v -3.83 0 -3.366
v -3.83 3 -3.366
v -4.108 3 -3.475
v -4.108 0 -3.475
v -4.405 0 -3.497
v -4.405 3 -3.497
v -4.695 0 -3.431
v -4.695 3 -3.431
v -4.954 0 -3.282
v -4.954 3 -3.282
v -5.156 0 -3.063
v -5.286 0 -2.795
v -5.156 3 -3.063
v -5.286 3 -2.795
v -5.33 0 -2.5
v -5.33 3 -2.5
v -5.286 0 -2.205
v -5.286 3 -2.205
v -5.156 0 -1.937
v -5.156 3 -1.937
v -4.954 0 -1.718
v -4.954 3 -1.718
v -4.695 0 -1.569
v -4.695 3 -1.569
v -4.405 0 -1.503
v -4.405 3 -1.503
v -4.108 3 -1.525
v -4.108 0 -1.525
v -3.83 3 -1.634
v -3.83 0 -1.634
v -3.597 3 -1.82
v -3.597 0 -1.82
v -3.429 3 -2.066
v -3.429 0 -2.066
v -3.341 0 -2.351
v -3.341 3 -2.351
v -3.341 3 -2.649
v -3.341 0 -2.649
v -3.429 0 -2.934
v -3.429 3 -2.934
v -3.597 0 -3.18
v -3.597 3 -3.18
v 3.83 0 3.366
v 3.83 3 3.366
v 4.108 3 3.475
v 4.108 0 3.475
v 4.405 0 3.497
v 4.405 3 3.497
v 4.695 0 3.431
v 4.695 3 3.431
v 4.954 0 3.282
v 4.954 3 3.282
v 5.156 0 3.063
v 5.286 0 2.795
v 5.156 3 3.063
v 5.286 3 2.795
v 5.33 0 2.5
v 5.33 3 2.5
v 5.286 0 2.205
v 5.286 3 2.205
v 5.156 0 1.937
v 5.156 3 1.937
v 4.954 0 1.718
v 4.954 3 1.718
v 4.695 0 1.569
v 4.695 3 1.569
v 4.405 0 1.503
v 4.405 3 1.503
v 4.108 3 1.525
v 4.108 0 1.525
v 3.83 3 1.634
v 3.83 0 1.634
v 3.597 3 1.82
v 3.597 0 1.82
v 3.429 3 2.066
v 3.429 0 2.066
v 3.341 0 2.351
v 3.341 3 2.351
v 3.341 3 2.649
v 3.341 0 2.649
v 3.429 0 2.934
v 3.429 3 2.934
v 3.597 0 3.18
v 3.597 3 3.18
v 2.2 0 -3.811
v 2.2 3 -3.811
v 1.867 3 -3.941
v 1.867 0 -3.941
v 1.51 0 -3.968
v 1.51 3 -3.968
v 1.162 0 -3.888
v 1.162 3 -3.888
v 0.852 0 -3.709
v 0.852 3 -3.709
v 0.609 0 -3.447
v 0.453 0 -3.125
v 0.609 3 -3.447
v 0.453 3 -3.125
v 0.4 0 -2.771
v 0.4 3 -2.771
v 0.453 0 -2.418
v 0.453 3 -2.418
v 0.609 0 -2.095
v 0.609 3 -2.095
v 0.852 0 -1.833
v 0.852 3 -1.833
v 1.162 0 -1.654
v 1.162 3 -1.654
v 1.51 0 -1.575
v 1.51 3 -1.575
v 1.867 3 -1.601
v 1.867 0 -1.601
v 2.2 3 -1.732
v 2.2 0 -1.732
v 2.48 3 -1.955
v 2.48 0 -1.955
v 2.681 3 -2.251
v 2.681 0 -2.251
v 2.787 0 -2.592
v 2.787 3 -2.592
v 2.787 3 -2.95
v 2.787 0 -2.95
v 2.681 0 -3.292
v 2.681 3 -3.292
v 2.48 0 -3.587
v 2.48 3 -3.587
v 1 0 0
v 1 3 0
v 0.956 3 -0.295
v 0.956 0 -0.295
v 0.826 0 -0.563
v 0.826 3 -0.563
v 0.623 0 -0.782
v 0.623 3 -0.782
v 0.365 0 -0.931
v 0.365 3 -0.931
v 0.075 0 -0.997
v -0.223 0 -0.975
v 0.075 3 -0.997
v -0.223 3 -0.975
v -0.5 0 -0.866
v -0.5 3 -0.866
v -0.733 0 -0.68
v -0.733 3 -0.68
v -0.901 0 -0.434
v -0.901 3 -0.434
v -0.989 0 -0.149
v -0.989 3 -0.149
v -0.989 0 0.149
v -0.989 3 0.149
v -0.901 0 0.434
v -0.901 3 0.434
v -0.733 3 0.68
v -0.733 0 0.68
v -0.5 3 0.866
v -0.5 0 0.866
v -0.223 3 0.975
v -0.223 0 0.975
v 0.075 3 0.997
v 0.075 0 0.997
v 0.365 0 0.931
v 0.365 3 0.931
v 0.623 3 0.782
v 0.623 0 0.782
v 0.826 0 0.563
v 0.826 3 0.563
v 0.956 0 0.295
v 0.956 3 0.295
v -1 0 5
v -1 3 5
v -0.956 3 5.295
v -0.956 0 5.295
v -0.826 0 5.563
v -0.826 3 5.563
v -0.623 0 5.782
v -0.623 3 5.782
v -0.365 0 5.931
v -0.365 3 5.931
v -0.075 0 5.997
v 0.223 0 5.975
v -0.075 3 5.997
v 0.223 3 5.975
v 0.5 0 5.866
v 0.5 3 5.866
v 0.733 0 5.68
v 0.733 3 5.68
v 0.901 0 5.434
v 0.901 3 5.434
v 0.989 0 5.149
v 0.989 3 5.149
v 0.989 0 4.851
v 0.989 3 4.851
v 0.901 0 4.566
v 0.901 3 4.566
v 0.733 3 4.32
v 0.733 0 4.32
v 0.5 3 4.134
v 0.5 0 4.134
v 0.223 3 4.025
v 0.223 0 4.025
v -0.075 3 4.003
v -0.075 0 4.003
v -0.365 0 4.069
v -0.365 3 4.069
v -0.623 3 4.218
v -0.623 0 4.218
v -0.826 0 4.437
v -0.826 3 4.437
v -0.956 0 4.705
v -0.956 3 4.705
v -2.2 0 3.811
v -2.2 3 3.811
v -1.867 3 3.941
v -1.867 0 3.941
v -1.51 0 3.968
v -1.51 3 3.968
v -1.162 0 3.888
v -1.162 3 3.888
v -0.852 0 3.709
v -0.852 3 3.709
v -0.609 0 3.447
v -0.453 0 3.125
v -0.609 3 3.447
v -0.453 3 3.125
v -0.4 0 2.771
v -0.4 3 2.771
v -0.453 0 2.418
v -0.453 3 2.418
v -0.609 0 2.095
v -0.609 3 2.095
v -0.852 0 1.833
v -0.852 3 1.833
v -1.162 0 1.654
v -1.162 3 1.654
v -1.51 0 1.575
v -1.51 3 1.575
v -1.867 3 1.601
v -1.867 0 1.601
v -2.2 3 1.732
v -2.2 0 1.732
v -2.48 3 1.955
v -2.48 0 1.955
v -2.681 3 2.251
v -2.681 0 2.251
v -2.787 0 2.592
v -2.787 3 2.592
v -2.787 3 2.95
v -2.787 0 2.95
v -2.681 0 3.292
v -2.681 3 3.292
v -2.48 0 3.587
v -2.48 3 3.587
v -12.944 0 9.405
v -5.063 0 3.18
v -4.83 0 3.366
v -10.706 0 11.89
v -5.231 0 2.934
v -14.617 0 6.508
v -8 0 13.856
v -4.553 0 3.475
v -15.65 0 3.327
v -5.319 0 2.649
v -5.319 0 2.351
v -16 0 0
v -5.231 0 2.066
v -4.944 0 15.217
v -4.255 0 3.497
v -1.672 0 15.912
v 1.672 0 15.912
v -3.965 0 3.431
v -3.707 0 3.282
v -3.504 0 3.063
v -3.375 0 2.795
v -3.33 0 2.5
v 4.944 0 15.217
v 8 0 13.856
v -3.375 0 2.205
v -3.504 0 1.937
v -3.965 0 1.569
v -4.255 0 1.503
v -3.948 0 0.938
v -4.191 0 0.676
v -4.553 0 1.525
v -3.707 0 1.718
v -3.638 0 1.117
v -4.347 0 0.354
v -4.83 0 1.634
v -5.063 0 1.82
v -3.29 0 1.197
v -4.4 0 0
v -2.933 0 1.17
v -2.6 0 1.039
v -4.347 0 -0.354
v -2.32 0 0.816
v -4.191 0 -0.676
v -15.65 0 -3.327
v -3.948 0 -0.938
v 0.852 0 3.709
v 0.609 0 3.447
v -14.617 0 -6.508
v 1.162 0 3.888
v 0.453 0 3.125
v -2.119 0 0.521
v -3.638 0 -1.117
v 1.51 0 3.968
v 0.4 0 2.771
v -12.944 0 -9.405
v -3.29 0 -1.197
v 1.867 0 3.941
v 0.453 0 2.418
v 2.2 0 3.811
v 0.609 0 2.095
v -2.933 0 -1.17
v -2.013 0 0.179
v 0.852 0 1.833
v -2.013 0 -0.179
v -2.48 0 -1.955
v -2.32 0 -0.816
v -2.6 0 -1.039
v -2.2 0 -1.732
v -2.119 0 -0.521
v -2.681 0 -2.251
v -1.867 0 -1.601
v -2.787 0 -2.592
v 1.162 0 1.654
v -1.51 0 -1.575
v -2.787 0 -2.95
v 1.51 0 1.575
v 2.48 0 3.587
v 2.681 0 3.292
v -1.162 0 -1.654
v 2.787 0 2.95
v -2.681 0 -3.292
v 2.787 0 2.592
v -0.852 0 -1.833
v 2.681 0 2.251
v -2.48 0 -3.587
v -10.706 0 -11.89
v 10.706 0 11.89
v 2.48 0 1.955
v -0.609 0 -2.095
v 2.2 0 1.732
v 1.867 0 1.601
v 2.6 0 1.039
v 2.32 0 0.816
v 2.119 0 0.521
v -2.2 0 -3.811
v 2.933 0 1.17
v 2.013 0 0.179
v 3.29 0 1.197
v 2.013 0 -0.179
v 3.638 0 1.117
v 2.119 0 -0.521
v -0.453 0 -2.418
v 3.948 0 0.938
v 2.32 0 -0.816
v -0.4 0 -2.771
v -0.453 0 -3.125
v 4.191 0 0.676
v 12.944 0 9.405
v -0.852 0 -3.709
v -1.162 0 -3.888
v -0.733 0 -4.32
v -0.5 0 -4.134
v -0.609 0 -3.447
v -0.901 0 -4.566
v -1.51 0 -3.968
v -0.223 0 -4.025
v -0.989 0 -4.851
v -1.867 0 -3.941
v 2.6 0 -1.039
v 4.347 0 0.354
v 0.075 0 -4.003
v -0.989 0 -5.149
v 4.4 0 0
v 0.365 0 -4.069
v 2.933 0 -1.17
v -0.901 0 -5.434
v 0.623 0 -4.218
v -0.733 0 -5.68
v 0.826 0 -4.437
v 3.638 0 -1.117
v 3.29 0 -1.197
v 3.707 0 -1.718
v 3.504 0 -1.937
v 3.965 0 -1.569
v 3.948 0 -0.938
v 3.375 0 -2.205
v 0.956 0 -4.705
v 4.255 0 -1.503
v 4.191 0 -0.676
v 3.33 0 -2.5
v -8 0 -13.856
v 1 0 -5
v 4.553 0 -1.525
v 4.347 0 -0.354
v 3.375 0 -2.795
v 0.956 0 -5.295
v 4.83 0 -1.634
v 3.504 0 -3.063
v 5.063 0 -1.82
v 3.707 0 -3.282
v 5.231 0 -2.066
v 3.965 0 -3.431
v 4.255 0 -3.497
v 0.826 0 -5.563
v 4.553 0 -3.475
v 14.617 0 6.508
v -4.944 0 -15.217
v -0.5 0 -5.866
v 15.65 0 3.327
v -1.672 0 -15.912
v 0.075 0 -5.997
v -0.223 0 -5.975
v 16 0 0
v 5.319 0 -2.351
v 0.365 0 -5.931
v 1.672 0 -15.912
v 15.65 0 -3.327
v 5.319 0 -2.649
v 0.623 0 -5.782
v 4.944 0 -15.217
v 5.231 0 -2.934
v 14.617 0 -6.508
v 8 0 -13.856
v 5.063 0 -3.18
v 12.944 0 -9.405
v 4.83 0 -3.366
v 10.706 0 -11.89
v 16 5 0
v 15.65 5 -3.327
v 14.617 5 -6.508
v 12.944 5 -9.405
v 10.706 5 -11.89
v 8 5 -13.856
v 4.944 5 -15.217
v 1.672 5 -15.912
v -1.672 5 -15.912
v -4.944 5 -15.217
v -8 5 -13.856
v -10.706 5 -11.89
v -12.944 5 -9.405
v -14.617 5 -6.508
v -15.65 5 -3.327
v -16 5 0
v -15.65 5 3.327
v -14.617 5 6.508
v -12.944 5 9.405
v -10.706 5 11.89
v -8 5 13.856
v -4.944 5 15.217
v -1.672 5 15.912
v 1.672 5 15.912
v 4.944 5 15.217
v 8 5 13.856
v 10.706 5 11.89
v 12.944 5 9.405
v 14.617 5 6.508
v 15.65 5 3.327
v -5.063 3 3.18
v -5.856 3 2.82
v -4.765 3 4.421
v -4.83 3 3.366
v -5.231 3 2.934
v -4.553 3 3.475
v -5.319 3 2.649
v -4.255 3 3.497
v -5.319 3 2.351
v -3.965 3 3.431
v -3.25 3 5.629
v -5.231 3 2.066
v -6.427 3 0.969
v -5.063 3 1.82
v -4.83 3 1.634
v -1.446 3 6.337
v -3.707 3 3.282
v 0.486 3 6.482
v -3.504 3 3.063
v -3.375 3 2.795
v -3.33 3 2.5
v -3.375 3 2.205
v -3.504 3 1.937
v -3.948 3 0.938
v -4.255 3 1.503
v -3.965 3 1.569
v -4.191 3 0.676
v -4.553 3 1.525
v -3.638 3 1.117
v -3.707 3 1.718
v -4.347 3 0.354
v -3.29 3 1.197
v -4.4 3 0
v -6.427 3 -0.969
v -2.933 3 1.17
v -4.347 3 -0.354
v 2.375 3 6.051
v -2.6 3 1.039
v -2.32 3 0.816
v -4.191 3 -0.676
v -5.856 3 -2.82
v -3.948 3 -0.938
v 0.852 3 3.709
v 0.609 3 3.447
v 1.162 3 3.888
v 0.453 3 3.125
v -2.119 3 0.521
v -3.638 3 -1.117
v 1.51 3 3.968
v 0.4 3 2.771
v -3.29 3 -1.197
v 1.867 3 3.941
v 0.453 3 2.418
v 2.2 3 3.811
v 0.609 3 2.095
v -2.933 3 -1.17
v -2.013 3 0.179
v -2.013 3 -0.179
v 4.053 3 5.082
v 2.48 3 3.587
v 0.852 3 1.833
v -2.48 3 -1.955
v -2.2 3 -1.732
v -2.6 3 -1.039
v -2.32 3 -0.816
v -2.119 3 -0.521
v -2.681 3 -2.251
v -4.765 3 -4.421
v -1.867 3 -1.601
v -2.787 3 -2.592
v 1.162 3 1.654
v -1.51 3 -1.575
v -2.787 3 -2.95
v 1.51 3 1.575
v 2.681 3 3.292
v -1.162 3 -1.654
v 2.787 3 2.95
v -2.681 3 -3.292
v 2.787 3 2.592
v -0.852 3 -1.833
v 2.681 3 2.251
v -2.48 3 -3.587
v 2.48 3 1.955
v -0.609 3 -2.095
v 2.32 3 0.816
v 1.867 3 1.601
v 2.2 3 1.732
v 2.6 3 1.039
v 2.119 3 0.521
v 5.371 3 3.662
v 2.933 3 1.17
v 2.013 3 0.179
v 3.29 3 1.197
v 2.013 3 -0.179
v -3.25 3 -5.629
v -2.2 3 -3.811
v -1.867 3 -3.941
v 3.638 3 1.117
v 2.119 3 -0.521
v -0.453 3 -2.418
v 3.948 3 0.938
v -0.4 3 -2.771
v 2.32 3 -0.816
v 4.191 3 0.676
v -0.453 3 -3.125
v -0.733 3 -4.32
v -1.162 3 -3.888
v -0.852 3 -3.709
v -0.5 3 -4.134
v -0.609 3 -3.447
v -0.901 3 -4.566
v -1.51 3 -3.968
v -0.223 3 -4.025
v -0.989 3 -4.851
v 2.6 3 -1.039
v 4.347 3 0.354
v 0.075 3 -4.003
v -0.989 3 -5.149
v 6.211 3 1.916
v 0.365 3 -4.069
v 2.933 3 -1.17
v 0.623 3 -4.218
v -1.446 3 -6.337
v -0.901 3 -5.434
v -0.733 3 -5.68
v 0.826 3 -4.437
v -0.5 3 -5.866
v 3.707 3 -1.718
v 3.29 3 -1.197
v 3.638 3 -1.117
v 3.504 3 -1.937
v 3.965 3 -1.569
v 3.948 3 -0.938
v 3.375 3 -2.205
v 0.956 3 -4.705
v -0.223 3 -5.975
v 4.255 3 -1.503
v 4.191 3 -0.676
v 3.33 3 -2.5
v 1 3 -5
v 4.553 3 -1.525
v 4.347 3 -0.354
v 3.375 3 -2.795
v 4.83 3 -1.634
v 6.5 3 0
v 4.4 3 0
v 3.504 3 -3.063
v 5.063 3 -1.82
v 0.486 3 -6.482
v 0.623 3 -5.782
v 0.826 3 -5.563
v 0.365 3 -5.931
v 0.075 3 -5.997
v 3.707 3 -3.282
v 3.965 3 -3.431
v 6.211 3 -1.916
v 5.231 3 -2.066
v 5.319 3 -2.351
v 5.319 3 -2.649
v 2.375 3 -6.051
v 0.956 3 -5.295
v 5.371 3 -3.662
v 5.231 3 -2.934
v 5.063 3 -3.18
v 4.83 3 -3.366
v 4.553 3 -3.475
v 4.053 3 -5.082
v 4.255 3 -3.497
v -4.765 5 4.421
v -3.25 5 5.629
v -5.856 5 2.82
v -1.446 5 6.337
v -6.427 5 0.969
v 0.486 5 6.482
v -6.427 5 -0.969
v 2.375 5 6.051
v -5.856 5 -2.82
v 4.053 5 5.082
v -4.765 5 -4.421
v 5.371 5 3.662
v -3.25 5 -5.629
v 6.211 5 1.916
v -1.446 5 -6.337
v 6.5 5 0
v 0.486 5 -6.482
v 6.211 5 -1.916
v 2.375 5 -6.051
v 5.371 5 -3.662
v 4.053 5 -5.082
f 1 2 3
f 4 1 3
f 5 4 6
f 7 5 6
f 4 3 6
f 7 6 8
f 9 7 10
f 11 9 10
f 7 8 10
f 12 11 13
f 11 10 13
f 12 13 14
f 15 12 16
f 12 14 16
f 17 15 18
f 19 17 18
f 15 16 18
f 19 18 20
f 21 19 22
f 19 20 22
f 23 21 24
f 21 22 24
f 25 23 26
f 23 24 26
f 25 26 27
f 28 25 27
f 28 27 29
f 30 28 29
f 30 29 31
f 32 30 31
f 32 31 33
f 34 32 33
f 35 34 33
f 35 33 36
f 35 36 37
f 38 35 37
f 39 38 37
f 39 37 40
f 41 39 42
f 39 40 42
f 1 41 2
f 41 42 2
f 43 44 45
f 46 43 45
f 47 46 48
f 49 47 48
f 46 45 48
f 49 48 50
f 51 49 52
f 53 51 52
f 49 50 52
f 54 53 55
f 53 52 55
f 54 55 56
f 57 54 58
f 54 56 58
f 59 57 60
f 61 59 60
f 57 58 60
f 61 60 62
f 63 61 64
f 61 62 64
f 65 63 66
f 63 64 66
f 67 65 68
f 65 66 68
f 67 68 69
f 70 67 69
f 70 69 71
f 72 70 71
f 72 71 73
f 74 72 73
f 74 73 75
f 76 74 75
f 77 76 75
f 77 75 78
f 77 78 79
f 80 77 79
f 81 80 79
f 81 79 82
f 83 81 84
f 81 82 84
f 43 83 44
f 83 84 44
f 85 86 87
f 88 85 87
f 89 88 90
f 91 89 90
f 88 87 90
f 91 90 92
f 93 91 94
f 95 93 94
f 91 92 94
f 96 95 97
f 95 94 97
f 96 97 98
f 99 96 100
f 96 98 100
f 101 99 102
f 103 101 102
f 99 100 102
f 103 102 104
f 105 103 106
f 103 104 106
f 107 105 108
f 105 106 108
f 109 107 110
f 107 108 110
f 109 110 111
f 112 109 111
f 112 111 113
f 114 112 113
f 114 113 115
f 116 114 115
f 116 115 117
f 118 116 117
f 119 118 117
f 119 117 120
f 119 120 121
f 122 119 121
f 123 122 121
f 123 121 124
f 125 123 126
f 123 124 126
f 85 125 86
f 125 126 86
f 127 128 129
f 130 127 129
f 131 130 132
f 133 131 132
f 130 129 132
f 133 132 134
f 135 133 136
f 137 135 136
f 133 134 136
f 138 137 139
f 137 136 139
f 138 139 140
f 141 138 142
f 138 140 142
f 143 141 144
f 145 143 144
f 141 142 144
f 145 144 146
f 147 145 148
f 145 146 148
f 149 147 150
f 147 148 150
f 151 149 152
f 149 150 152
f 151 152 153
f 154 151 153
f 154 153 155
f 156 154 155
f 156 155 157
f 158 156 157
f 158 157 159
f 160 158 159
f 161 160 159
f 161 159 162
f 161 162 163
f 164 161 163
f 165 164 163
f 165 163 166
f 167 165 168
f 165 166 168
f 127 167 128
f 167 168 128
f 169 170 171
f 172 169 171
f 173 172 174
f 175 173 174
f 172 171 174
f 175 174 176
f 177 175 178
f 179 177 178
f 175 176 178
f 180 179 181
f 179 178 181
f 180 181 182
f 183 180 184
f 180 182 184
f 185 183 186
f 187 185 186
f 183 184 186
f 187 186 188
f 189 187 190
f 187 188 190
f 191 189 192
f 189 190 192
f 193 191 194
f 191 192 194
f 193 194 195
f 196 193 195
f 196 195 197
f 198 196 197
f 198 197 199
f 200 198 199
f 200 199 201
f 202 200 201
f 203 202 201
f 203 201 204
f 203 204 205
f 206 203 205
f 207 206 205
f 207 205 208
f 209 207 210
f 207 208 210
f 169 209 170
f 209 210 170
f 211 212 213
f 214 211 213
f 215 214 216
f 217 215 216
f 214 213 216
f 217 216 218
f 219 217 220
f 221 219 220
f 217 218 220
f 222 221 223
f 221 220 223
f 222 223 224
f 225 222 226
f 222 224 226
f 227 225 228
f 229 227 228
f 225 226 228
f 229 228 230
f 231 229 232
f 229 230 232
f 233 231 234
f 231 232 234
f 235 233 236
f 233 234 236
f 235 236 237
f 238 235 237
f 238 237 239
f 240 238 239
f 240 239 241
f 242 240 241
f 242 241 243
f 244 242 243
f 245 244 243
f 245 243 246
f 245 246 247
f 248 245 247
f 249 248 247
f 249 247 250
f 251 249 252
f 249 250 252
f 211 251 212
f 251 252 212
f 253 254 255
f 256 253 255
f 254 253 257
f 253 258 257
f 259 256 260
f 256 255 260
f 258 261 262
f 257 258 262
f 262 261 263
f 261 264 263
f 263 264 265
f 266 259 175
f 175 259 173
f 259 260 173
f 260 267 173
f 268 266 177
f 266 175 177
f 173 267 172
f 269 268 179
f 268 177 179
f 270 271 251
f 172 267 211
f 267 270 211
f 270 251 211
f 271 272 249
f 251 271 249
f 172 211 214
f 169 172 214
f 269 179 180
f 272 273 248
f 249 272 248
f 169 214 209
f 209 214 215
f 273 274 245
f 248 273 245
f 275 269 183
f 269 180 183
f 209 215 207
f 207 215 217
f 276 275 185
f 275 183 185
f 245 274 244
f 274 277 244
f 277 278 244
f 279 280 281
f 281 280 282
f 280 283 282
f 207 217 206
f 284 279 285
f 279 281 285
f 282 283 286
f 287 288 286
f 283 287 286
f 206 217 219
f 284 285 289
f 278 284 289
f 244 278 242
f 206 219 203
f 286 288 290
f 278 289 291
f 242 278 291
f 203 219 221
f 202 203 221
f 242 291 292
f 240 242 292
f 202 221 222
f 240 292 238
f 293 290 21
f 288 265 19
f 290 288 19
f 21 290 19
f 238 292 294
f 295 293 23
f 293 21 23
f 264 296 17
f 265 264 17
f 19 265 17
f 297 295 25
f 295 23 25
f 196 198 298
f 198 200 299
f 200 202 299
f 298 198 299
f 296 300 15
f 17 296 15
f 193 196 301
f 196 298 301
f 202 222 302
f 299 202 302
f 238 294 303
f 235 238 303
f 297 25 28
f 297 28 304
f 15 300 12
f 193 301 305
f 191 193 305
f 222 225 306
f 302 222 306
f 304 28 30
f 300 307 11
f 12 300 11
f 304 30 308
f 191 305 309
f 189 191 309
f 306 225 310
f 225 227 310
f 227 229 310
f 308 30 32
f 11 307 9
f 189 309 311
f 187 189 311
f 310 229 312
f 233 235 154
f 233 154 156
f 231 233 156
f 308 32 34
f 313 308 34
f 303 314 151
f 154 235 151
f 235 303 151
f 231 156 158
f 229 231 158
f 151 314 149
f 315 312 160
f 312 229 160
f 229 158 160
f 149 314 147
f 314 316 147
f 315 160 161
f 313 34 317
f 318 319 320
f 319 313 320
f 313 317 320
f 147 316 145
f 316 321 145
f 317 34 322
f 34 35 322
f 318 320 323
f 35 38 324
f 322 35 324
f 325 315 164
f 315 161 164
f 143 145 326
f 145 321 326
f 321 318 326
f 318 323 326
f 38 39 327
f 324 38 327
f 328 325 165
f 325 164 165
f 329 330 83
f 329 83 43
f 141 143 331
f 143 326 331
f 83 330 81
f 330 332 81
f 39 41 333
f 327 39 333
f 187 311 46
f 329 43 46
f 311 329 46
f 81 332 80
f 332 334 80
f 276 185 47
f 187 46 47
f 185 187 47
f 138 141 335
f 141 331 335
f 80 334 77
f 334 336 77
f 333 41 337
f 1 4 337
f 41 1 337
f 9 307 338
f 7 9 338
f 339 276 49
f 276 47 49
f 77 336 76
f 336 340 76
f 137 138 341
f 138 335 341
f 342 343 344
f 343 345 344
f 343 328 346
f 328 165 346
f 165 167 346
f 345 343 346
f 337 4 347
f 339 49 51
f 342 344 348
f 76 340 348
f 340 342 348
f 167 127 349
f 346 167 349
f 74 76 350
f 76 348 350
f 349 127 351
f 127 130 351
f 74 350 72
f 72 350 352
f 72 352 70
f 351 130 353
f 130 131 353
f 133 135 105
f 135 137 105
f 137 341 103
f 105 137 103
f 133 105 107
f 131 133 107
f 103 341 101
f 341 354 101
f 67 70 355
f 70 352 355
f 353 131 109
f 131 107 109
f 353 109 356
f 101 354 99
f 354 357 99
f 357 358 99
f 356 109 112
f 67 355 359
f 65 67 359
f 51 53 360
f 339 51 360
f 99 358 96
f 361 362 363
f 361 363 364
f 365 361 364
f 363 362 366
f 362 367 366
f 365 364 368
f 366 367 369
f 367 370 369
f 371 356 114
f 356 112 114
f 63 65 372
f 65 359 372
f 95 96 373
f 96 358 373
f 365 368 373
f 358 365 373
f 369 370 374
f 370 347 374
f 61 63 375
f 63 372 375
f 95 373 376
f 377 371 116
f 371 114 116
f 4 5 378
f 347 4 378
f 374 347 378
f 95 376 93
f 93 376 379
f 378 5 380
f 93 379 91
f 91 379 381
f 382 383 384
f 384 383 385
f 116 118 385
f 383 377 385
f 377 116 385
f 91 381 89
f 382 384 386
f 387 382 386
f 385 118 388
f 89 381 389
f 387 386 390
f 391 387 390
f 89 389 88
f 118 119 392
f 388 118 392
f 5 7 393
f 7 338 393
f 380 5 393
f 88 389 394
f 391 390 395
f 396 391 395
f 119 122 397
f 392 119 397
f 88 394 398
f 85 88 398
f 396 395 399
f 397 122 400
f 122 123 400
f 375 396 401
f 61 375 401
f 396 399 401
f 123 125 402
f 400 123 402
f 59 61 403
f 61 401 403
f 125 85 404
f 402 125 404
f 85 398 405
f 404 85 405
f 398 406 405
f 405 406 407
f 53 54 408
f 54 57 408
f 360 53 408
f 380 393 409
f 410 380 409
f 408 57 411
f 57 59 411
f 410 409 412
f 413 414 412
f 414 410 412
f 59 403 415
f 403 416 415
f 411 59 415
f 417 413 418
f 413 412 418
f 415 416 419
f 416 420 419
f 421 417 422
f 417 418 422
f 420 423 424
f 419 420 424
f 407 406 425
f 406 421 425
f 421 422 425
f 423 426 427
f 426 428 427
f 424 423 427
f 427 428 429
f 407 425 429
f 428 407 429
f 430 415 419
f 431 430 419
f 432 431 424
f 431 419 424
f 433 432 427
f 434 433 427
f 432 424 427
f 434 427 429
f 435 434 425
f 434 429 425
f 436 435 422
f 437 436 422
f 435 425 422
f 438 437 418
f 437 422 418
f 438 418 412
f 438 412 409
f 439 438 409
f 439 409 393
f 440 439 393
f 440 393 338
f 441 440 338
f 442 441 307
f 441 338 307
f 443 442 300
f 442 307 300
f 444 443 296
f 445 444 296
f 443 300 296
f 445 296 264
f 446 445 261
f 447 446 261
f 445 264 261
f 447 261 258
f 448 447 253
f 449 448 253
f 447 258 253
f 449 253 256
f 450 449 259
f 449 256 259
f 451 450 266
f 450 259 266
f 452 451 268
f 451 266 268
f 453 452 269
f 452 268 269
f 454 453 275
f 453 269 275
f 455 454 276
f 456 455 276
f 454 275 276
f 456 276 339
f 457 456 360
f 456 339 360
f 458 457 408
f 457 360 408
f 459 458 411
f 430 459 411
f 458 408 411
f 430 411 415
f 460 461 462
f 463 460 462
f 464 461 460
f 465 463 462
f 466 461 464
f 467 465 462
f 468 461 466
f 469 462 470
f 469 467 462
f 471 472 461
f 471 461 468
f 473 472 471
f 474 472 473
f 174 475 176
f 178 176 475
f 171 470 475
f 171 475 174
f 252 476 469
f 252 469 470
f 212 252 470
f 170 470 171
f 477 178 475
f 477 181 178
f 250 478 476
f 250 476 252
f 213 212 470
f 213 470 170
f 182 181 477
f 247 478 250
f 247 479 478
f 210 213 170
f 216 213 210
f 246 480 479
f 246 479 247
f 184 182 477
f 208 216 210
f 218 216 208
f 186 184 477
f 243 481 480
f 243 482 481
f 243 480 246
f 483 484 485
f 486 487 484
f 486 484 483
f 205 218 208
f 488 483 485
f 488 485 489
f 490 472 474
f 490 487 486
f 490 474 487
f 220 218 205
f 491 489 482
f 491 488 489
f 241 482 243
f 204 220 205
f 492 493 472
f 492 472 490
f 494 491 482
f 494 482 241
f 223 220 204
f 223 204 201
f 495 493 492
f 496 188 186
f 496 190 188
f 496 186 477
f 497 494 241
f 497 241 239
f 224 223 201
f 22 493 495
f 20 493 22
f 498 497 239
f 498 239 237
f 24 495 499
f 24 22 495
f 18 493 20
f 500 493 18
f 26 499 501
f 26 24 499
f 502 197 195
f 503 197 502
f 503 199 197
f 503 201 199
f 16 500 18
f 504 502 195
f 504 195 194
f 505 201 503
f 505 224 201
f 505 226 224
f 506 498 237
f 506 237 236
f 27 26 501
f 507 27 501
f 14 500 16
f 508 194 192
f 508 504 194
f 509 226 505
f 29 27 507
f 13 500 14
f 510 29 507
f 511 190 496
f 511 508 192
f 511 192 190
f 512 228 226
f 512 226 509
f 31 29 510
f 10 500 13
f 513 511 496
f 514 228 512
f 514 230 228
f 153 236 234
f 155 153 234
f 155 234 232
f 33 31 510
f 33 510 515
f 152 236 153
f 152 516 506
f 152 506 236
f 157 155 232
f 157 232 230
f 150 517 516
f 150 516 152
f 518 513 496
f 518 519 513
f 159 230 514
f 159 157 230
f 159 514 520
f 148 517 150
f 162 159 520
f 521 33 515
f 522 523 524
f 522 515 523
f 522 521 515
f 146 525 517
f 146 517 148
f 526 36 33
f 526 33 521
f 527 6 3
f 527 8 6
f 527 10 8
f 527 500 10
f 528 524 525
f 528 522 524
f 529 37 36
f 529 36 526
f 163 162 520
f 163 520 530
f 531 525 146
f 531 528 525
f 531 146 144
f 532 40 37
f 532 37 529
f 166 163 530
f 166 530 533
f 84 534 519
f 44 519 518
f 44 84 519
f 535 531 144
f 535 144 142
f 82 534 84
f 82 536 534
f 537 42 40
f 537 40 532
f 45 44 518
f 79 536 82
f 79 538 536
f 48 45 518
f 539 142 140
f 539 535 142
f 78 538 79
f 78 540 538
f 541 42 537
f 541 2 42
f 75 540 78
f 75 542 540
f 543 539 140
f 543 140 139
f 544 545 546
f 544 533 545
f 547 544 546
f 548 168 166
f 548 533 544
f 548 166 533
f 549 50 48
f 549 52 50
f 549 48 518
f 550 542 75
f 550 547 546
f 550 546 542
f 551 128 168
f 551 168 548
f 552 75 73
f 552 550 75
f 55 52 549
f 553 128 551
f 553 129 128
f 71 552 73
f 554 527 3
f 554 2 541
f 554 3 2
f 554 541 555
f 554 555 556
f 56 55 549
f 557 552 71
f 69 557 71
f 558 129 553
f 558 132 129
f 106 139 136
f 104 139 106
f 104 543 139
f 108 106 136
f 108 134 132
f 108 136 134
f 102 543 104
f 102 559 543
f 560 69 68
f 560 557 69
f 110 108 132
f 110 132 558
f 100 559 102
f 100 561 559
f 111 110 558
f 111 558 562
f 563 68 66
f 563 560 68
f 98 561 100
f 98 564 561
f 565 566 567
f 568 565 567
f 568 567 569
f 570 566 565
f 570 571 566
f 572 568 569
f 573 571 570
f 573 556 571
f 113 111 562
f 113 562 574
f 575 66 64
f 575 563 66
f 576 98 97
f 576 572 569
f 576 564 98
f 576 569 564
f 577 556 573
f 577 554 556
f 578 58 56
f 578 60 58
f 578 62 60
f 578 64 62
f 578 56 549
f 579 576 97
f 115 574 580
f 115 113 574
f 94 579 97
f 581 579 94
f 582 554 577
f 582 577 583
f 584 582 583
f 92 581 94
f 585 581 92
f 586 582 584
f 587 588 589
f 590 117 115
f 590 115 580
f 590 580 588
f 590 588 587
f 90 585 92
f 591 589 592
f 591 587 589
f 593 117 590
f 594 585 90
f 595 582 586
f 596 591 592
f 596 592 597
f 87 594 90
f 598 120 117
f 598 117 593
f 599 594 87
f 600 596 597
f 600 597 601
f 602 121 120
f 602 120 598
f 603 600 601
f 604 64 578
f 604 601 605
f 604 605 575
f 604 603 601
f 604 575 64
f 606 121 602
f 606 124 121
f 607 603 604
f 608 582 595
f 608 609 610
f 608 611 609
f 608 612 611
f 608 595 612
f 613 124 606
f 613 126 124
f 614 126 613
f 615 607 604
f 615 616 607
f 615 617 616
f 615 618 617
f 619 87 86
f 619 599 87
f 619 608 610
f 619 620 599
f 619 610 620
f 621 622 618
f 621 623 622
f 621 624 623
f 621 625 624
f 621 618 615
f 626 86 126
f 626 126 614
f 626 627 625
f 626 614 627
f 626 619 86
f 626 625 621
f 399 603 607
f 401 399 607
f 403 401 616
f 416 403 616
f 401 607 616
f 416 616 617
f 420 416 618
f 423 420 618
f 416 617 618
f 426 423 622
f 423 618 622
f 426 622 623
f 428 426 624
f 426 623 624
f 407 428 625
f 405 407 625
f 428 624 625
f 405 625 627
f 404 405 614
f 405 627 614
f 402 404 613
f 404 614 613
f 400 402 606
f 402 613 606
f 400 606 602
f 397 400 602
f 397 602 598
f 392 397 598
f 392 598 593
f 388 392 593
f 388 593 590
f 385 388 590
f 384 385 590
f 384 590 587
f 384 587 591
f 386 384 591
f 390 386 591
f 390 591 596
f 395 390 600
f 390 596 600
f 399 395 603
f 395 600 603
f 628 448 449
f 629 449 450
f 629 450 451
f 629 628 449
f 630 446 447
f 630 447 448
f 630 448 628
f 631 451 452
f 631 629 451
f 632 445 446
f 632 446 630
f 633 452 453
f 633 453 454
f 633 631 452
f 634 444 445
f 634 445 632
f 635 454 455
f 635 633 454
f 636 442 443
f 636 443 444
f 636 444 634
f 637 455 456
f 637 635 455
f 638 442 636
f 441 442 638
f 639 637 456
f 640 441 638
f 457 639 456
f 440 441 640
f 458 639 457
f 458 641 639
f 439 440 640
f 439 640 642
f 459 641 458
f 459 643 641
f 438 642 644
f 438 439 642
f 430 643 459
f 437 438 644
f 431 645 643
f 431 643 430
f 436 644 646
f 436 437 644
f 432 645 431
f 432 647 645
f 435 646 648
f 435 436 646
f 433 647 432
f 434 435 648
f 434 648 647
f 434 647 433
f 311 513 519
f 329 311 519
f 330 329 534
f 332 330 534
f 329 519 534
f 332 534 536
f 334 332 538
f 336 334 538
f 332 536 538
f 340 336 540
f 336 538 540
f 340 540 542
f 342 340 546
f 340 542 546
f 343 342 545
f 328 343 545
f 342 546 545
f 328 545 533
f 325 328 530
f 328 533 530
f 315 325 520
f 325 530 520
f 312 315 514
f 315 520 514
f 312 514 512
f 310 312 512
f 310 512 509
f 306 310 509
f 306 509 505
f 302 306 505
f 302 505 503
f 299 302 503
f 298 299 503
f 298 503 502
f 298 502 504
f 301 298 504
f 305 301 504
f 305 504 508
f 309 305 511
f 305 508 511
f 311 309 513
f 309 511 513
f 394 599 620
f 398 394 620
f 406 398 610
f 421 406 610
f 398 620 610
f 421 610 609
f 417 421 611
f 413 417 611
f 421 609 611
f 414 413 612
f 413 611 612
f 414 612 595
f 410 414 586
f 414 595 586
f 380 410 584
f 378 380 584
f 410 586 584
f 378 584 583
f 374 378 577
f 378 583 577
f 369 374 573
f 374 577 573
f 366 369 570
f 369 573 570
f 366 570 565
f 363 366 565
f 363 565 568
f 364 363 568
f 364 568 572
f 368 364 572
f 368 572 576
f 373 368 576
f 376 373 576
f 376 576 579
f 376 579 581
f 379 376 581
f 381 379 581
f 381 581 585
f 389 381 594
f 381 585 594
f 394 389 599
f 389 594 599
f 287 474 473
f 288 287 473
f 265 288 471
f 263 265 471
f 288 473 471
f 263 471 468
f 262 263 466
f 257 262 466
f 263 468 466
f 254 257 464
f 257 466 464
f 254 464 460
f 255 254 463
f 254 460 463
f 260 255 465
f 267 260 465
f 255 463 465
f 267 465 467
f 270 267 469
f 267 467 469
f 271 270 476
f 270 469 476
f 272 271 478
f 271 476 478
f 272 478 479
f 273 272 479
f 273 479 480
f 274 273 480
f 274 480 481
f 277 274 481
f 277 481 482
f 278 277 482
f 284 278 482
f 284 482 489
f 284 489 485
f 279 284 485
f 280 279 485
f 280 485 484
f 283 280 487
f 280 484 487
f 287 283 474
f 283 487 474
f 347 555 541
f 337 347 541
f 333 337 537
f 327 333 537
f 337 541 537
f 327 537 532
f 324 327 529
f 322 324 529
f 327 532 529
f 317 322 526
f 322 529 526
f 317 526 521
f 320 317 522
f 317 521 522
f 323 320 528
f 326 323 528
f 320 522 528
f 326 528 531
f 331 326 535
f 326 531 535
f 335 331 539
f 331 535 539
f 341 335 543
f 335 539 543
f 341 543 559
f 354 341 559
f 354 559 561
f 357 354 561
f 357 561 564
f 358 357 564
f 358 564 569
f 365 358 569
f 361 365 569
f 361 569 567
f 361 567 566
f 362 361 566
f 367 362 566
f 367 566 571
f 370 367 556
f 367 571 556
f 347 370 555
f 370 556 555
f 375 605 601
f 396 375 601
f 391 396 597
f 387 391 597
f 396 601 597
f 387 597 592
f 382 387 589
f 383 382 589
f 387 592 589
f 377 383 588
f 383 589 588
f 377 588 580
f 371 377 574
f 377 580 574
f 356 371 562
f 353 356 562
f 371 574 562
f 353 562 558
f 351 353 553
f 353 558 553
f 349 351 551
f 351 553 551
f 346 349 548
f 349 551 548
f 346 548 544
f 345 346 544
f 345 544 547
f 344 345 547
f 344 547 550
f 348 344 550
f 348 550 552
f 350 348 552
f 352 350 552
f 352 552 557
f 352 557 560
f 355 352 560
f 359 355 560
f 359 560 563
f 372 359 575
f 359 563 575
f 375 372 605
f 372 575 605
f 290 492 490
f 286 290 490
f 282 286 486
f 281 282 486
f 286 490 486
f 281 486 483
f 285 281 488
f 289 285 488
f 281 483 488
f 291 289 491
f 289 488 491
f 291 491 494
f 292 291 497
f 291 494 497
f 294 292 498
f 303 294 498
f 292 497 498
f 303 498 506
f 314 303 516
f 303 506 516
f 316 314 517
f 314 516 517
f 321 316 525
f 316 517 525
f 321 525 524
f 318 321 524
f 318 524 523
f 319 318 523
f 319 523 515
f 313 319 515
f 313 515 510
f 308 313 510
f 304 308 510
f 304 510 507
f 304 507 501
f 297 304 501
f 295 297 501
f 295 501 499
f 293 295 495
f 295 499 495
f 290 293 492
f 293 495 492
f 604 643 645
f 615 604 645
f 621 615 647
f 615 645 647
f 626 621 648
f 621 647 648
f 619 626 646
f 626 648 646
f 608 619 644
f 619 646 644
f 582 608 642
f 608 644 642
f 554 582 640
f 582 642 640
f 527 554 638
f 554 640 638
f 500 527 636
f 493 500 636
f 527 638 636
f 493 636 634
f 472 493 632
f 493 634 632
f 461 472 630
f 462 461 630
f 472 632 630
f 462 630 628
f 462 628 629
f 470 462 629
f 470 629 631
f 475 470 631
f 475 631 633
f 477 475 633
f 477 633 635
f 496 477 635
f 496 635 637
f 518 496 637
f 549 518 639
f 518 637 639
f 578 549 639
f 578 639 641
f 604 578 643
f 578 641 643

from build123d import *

# Parameters (mm, degrees)
SKETCH1_R           = 16
BOSS_EXTRUDE1_DEPTH = 5
SKETCH2_R           = 6.5
CUT_EXTRUDE2_DEPTH  = 2
SKETCH3_R           = 1
CUT_EXTRUDE3_DEPTH  = 3
SKETCH4_R           = 1.2
CUT_EXTRUDE4_DEPTH  = 3
SKETCH6_R           = 1
CUT_EXTRUDE6_DEPTH  = 3
CIRPATTERN3_COUNT   = 6
CIRPATTERN5_COUNT   = 6


with BuildPart() as part:
    # Sketch1 → Boss-Extrude1 (new body)
    with BuildSketch(Plane(origin=(0, 0, 0), x_dir=(1, 0, 0), z_dir=(0, 1, 0))):
        Circle(SKETCH1_R)
    extrude(amount=BOSS_EXTRUDE1_DEPTH)

    # Sketch2 → Cut-Extrude2 (cut)
    with BuildSketch(Plane(origin=(0, 5, 0), x_dir=(1, 0, 0), z_dir=(0, 1, 0))):
        Circle(SKETCH2_R)
    extrude(amount=-CUT_EXTRUDE2_DEPTH, mode=Mode.SUBTRACT)

    # Sketch3 → Cut-Extrude3 (cut)
    with BuildSketch(Plane(origin=(0, 3, 0), x_dir=(1, 0, 0), z_dir=(0, 1, 0))):
        Circle(SKETCH3_R)
    extrude(amount=-CUT_EXTRUDE3_DEPTH, mode=Mode.SUBTRACT)

    # Sketch4 → Cut-Extrude4 (cut)
    with BuildSketch(Plane(origin=(0, 3, 0), x_dir=(1, 0, 0), z_dir=(0, 1, 0))):
        with Locations((3.2, 0)):
            Circle(SKETCH4_R)
    cut_extrude4 = extrude(amount=-CUT_EXTRUDE4_DEPTH, mode=Mode.SUBTRACT)

    # Sketch6 → Cut-Extrude6 (cut)
    with BuildSketch(Plane(origin=(0, 3, 0), x_dir=(1, 0, 0), z_dir=(0, 1, 0))):
        with Locations((0, 5)):
            Circle(SKETCH6_R)
    cut_extrude6 = extrude(amount=-CUT_EXTRUDE6_DEPTH, mode=Mode.SUBTRACT)

    # CirPattern3: Cut-Extrude6 ×6 about axis
    cirpattern3_axis = Axis((0, 0, 0), (0, 1, 0))
    for i in range(1, CIRPATTERN3_COUNT):
        add(cut_extrude6.rotate(cirpattern3_axis, i * 360 / CIRPATTERN3_COUNT), mode=Mode.SUBTRACT)

    # CirPattern5: Cut-Extrude4 ×6 about axis
    cirpattern5_axis = Axis((0, 0, 0), (0, 1, 0))
    for i in range(1, CIRPATTERN5_COUNT):
        add(cut_extrude4.rotate(cirpattern5_axis, i * 360 / CIRPATTERN5_COUNT), mode=Mode.SUBTRACT)


solid = part.part
